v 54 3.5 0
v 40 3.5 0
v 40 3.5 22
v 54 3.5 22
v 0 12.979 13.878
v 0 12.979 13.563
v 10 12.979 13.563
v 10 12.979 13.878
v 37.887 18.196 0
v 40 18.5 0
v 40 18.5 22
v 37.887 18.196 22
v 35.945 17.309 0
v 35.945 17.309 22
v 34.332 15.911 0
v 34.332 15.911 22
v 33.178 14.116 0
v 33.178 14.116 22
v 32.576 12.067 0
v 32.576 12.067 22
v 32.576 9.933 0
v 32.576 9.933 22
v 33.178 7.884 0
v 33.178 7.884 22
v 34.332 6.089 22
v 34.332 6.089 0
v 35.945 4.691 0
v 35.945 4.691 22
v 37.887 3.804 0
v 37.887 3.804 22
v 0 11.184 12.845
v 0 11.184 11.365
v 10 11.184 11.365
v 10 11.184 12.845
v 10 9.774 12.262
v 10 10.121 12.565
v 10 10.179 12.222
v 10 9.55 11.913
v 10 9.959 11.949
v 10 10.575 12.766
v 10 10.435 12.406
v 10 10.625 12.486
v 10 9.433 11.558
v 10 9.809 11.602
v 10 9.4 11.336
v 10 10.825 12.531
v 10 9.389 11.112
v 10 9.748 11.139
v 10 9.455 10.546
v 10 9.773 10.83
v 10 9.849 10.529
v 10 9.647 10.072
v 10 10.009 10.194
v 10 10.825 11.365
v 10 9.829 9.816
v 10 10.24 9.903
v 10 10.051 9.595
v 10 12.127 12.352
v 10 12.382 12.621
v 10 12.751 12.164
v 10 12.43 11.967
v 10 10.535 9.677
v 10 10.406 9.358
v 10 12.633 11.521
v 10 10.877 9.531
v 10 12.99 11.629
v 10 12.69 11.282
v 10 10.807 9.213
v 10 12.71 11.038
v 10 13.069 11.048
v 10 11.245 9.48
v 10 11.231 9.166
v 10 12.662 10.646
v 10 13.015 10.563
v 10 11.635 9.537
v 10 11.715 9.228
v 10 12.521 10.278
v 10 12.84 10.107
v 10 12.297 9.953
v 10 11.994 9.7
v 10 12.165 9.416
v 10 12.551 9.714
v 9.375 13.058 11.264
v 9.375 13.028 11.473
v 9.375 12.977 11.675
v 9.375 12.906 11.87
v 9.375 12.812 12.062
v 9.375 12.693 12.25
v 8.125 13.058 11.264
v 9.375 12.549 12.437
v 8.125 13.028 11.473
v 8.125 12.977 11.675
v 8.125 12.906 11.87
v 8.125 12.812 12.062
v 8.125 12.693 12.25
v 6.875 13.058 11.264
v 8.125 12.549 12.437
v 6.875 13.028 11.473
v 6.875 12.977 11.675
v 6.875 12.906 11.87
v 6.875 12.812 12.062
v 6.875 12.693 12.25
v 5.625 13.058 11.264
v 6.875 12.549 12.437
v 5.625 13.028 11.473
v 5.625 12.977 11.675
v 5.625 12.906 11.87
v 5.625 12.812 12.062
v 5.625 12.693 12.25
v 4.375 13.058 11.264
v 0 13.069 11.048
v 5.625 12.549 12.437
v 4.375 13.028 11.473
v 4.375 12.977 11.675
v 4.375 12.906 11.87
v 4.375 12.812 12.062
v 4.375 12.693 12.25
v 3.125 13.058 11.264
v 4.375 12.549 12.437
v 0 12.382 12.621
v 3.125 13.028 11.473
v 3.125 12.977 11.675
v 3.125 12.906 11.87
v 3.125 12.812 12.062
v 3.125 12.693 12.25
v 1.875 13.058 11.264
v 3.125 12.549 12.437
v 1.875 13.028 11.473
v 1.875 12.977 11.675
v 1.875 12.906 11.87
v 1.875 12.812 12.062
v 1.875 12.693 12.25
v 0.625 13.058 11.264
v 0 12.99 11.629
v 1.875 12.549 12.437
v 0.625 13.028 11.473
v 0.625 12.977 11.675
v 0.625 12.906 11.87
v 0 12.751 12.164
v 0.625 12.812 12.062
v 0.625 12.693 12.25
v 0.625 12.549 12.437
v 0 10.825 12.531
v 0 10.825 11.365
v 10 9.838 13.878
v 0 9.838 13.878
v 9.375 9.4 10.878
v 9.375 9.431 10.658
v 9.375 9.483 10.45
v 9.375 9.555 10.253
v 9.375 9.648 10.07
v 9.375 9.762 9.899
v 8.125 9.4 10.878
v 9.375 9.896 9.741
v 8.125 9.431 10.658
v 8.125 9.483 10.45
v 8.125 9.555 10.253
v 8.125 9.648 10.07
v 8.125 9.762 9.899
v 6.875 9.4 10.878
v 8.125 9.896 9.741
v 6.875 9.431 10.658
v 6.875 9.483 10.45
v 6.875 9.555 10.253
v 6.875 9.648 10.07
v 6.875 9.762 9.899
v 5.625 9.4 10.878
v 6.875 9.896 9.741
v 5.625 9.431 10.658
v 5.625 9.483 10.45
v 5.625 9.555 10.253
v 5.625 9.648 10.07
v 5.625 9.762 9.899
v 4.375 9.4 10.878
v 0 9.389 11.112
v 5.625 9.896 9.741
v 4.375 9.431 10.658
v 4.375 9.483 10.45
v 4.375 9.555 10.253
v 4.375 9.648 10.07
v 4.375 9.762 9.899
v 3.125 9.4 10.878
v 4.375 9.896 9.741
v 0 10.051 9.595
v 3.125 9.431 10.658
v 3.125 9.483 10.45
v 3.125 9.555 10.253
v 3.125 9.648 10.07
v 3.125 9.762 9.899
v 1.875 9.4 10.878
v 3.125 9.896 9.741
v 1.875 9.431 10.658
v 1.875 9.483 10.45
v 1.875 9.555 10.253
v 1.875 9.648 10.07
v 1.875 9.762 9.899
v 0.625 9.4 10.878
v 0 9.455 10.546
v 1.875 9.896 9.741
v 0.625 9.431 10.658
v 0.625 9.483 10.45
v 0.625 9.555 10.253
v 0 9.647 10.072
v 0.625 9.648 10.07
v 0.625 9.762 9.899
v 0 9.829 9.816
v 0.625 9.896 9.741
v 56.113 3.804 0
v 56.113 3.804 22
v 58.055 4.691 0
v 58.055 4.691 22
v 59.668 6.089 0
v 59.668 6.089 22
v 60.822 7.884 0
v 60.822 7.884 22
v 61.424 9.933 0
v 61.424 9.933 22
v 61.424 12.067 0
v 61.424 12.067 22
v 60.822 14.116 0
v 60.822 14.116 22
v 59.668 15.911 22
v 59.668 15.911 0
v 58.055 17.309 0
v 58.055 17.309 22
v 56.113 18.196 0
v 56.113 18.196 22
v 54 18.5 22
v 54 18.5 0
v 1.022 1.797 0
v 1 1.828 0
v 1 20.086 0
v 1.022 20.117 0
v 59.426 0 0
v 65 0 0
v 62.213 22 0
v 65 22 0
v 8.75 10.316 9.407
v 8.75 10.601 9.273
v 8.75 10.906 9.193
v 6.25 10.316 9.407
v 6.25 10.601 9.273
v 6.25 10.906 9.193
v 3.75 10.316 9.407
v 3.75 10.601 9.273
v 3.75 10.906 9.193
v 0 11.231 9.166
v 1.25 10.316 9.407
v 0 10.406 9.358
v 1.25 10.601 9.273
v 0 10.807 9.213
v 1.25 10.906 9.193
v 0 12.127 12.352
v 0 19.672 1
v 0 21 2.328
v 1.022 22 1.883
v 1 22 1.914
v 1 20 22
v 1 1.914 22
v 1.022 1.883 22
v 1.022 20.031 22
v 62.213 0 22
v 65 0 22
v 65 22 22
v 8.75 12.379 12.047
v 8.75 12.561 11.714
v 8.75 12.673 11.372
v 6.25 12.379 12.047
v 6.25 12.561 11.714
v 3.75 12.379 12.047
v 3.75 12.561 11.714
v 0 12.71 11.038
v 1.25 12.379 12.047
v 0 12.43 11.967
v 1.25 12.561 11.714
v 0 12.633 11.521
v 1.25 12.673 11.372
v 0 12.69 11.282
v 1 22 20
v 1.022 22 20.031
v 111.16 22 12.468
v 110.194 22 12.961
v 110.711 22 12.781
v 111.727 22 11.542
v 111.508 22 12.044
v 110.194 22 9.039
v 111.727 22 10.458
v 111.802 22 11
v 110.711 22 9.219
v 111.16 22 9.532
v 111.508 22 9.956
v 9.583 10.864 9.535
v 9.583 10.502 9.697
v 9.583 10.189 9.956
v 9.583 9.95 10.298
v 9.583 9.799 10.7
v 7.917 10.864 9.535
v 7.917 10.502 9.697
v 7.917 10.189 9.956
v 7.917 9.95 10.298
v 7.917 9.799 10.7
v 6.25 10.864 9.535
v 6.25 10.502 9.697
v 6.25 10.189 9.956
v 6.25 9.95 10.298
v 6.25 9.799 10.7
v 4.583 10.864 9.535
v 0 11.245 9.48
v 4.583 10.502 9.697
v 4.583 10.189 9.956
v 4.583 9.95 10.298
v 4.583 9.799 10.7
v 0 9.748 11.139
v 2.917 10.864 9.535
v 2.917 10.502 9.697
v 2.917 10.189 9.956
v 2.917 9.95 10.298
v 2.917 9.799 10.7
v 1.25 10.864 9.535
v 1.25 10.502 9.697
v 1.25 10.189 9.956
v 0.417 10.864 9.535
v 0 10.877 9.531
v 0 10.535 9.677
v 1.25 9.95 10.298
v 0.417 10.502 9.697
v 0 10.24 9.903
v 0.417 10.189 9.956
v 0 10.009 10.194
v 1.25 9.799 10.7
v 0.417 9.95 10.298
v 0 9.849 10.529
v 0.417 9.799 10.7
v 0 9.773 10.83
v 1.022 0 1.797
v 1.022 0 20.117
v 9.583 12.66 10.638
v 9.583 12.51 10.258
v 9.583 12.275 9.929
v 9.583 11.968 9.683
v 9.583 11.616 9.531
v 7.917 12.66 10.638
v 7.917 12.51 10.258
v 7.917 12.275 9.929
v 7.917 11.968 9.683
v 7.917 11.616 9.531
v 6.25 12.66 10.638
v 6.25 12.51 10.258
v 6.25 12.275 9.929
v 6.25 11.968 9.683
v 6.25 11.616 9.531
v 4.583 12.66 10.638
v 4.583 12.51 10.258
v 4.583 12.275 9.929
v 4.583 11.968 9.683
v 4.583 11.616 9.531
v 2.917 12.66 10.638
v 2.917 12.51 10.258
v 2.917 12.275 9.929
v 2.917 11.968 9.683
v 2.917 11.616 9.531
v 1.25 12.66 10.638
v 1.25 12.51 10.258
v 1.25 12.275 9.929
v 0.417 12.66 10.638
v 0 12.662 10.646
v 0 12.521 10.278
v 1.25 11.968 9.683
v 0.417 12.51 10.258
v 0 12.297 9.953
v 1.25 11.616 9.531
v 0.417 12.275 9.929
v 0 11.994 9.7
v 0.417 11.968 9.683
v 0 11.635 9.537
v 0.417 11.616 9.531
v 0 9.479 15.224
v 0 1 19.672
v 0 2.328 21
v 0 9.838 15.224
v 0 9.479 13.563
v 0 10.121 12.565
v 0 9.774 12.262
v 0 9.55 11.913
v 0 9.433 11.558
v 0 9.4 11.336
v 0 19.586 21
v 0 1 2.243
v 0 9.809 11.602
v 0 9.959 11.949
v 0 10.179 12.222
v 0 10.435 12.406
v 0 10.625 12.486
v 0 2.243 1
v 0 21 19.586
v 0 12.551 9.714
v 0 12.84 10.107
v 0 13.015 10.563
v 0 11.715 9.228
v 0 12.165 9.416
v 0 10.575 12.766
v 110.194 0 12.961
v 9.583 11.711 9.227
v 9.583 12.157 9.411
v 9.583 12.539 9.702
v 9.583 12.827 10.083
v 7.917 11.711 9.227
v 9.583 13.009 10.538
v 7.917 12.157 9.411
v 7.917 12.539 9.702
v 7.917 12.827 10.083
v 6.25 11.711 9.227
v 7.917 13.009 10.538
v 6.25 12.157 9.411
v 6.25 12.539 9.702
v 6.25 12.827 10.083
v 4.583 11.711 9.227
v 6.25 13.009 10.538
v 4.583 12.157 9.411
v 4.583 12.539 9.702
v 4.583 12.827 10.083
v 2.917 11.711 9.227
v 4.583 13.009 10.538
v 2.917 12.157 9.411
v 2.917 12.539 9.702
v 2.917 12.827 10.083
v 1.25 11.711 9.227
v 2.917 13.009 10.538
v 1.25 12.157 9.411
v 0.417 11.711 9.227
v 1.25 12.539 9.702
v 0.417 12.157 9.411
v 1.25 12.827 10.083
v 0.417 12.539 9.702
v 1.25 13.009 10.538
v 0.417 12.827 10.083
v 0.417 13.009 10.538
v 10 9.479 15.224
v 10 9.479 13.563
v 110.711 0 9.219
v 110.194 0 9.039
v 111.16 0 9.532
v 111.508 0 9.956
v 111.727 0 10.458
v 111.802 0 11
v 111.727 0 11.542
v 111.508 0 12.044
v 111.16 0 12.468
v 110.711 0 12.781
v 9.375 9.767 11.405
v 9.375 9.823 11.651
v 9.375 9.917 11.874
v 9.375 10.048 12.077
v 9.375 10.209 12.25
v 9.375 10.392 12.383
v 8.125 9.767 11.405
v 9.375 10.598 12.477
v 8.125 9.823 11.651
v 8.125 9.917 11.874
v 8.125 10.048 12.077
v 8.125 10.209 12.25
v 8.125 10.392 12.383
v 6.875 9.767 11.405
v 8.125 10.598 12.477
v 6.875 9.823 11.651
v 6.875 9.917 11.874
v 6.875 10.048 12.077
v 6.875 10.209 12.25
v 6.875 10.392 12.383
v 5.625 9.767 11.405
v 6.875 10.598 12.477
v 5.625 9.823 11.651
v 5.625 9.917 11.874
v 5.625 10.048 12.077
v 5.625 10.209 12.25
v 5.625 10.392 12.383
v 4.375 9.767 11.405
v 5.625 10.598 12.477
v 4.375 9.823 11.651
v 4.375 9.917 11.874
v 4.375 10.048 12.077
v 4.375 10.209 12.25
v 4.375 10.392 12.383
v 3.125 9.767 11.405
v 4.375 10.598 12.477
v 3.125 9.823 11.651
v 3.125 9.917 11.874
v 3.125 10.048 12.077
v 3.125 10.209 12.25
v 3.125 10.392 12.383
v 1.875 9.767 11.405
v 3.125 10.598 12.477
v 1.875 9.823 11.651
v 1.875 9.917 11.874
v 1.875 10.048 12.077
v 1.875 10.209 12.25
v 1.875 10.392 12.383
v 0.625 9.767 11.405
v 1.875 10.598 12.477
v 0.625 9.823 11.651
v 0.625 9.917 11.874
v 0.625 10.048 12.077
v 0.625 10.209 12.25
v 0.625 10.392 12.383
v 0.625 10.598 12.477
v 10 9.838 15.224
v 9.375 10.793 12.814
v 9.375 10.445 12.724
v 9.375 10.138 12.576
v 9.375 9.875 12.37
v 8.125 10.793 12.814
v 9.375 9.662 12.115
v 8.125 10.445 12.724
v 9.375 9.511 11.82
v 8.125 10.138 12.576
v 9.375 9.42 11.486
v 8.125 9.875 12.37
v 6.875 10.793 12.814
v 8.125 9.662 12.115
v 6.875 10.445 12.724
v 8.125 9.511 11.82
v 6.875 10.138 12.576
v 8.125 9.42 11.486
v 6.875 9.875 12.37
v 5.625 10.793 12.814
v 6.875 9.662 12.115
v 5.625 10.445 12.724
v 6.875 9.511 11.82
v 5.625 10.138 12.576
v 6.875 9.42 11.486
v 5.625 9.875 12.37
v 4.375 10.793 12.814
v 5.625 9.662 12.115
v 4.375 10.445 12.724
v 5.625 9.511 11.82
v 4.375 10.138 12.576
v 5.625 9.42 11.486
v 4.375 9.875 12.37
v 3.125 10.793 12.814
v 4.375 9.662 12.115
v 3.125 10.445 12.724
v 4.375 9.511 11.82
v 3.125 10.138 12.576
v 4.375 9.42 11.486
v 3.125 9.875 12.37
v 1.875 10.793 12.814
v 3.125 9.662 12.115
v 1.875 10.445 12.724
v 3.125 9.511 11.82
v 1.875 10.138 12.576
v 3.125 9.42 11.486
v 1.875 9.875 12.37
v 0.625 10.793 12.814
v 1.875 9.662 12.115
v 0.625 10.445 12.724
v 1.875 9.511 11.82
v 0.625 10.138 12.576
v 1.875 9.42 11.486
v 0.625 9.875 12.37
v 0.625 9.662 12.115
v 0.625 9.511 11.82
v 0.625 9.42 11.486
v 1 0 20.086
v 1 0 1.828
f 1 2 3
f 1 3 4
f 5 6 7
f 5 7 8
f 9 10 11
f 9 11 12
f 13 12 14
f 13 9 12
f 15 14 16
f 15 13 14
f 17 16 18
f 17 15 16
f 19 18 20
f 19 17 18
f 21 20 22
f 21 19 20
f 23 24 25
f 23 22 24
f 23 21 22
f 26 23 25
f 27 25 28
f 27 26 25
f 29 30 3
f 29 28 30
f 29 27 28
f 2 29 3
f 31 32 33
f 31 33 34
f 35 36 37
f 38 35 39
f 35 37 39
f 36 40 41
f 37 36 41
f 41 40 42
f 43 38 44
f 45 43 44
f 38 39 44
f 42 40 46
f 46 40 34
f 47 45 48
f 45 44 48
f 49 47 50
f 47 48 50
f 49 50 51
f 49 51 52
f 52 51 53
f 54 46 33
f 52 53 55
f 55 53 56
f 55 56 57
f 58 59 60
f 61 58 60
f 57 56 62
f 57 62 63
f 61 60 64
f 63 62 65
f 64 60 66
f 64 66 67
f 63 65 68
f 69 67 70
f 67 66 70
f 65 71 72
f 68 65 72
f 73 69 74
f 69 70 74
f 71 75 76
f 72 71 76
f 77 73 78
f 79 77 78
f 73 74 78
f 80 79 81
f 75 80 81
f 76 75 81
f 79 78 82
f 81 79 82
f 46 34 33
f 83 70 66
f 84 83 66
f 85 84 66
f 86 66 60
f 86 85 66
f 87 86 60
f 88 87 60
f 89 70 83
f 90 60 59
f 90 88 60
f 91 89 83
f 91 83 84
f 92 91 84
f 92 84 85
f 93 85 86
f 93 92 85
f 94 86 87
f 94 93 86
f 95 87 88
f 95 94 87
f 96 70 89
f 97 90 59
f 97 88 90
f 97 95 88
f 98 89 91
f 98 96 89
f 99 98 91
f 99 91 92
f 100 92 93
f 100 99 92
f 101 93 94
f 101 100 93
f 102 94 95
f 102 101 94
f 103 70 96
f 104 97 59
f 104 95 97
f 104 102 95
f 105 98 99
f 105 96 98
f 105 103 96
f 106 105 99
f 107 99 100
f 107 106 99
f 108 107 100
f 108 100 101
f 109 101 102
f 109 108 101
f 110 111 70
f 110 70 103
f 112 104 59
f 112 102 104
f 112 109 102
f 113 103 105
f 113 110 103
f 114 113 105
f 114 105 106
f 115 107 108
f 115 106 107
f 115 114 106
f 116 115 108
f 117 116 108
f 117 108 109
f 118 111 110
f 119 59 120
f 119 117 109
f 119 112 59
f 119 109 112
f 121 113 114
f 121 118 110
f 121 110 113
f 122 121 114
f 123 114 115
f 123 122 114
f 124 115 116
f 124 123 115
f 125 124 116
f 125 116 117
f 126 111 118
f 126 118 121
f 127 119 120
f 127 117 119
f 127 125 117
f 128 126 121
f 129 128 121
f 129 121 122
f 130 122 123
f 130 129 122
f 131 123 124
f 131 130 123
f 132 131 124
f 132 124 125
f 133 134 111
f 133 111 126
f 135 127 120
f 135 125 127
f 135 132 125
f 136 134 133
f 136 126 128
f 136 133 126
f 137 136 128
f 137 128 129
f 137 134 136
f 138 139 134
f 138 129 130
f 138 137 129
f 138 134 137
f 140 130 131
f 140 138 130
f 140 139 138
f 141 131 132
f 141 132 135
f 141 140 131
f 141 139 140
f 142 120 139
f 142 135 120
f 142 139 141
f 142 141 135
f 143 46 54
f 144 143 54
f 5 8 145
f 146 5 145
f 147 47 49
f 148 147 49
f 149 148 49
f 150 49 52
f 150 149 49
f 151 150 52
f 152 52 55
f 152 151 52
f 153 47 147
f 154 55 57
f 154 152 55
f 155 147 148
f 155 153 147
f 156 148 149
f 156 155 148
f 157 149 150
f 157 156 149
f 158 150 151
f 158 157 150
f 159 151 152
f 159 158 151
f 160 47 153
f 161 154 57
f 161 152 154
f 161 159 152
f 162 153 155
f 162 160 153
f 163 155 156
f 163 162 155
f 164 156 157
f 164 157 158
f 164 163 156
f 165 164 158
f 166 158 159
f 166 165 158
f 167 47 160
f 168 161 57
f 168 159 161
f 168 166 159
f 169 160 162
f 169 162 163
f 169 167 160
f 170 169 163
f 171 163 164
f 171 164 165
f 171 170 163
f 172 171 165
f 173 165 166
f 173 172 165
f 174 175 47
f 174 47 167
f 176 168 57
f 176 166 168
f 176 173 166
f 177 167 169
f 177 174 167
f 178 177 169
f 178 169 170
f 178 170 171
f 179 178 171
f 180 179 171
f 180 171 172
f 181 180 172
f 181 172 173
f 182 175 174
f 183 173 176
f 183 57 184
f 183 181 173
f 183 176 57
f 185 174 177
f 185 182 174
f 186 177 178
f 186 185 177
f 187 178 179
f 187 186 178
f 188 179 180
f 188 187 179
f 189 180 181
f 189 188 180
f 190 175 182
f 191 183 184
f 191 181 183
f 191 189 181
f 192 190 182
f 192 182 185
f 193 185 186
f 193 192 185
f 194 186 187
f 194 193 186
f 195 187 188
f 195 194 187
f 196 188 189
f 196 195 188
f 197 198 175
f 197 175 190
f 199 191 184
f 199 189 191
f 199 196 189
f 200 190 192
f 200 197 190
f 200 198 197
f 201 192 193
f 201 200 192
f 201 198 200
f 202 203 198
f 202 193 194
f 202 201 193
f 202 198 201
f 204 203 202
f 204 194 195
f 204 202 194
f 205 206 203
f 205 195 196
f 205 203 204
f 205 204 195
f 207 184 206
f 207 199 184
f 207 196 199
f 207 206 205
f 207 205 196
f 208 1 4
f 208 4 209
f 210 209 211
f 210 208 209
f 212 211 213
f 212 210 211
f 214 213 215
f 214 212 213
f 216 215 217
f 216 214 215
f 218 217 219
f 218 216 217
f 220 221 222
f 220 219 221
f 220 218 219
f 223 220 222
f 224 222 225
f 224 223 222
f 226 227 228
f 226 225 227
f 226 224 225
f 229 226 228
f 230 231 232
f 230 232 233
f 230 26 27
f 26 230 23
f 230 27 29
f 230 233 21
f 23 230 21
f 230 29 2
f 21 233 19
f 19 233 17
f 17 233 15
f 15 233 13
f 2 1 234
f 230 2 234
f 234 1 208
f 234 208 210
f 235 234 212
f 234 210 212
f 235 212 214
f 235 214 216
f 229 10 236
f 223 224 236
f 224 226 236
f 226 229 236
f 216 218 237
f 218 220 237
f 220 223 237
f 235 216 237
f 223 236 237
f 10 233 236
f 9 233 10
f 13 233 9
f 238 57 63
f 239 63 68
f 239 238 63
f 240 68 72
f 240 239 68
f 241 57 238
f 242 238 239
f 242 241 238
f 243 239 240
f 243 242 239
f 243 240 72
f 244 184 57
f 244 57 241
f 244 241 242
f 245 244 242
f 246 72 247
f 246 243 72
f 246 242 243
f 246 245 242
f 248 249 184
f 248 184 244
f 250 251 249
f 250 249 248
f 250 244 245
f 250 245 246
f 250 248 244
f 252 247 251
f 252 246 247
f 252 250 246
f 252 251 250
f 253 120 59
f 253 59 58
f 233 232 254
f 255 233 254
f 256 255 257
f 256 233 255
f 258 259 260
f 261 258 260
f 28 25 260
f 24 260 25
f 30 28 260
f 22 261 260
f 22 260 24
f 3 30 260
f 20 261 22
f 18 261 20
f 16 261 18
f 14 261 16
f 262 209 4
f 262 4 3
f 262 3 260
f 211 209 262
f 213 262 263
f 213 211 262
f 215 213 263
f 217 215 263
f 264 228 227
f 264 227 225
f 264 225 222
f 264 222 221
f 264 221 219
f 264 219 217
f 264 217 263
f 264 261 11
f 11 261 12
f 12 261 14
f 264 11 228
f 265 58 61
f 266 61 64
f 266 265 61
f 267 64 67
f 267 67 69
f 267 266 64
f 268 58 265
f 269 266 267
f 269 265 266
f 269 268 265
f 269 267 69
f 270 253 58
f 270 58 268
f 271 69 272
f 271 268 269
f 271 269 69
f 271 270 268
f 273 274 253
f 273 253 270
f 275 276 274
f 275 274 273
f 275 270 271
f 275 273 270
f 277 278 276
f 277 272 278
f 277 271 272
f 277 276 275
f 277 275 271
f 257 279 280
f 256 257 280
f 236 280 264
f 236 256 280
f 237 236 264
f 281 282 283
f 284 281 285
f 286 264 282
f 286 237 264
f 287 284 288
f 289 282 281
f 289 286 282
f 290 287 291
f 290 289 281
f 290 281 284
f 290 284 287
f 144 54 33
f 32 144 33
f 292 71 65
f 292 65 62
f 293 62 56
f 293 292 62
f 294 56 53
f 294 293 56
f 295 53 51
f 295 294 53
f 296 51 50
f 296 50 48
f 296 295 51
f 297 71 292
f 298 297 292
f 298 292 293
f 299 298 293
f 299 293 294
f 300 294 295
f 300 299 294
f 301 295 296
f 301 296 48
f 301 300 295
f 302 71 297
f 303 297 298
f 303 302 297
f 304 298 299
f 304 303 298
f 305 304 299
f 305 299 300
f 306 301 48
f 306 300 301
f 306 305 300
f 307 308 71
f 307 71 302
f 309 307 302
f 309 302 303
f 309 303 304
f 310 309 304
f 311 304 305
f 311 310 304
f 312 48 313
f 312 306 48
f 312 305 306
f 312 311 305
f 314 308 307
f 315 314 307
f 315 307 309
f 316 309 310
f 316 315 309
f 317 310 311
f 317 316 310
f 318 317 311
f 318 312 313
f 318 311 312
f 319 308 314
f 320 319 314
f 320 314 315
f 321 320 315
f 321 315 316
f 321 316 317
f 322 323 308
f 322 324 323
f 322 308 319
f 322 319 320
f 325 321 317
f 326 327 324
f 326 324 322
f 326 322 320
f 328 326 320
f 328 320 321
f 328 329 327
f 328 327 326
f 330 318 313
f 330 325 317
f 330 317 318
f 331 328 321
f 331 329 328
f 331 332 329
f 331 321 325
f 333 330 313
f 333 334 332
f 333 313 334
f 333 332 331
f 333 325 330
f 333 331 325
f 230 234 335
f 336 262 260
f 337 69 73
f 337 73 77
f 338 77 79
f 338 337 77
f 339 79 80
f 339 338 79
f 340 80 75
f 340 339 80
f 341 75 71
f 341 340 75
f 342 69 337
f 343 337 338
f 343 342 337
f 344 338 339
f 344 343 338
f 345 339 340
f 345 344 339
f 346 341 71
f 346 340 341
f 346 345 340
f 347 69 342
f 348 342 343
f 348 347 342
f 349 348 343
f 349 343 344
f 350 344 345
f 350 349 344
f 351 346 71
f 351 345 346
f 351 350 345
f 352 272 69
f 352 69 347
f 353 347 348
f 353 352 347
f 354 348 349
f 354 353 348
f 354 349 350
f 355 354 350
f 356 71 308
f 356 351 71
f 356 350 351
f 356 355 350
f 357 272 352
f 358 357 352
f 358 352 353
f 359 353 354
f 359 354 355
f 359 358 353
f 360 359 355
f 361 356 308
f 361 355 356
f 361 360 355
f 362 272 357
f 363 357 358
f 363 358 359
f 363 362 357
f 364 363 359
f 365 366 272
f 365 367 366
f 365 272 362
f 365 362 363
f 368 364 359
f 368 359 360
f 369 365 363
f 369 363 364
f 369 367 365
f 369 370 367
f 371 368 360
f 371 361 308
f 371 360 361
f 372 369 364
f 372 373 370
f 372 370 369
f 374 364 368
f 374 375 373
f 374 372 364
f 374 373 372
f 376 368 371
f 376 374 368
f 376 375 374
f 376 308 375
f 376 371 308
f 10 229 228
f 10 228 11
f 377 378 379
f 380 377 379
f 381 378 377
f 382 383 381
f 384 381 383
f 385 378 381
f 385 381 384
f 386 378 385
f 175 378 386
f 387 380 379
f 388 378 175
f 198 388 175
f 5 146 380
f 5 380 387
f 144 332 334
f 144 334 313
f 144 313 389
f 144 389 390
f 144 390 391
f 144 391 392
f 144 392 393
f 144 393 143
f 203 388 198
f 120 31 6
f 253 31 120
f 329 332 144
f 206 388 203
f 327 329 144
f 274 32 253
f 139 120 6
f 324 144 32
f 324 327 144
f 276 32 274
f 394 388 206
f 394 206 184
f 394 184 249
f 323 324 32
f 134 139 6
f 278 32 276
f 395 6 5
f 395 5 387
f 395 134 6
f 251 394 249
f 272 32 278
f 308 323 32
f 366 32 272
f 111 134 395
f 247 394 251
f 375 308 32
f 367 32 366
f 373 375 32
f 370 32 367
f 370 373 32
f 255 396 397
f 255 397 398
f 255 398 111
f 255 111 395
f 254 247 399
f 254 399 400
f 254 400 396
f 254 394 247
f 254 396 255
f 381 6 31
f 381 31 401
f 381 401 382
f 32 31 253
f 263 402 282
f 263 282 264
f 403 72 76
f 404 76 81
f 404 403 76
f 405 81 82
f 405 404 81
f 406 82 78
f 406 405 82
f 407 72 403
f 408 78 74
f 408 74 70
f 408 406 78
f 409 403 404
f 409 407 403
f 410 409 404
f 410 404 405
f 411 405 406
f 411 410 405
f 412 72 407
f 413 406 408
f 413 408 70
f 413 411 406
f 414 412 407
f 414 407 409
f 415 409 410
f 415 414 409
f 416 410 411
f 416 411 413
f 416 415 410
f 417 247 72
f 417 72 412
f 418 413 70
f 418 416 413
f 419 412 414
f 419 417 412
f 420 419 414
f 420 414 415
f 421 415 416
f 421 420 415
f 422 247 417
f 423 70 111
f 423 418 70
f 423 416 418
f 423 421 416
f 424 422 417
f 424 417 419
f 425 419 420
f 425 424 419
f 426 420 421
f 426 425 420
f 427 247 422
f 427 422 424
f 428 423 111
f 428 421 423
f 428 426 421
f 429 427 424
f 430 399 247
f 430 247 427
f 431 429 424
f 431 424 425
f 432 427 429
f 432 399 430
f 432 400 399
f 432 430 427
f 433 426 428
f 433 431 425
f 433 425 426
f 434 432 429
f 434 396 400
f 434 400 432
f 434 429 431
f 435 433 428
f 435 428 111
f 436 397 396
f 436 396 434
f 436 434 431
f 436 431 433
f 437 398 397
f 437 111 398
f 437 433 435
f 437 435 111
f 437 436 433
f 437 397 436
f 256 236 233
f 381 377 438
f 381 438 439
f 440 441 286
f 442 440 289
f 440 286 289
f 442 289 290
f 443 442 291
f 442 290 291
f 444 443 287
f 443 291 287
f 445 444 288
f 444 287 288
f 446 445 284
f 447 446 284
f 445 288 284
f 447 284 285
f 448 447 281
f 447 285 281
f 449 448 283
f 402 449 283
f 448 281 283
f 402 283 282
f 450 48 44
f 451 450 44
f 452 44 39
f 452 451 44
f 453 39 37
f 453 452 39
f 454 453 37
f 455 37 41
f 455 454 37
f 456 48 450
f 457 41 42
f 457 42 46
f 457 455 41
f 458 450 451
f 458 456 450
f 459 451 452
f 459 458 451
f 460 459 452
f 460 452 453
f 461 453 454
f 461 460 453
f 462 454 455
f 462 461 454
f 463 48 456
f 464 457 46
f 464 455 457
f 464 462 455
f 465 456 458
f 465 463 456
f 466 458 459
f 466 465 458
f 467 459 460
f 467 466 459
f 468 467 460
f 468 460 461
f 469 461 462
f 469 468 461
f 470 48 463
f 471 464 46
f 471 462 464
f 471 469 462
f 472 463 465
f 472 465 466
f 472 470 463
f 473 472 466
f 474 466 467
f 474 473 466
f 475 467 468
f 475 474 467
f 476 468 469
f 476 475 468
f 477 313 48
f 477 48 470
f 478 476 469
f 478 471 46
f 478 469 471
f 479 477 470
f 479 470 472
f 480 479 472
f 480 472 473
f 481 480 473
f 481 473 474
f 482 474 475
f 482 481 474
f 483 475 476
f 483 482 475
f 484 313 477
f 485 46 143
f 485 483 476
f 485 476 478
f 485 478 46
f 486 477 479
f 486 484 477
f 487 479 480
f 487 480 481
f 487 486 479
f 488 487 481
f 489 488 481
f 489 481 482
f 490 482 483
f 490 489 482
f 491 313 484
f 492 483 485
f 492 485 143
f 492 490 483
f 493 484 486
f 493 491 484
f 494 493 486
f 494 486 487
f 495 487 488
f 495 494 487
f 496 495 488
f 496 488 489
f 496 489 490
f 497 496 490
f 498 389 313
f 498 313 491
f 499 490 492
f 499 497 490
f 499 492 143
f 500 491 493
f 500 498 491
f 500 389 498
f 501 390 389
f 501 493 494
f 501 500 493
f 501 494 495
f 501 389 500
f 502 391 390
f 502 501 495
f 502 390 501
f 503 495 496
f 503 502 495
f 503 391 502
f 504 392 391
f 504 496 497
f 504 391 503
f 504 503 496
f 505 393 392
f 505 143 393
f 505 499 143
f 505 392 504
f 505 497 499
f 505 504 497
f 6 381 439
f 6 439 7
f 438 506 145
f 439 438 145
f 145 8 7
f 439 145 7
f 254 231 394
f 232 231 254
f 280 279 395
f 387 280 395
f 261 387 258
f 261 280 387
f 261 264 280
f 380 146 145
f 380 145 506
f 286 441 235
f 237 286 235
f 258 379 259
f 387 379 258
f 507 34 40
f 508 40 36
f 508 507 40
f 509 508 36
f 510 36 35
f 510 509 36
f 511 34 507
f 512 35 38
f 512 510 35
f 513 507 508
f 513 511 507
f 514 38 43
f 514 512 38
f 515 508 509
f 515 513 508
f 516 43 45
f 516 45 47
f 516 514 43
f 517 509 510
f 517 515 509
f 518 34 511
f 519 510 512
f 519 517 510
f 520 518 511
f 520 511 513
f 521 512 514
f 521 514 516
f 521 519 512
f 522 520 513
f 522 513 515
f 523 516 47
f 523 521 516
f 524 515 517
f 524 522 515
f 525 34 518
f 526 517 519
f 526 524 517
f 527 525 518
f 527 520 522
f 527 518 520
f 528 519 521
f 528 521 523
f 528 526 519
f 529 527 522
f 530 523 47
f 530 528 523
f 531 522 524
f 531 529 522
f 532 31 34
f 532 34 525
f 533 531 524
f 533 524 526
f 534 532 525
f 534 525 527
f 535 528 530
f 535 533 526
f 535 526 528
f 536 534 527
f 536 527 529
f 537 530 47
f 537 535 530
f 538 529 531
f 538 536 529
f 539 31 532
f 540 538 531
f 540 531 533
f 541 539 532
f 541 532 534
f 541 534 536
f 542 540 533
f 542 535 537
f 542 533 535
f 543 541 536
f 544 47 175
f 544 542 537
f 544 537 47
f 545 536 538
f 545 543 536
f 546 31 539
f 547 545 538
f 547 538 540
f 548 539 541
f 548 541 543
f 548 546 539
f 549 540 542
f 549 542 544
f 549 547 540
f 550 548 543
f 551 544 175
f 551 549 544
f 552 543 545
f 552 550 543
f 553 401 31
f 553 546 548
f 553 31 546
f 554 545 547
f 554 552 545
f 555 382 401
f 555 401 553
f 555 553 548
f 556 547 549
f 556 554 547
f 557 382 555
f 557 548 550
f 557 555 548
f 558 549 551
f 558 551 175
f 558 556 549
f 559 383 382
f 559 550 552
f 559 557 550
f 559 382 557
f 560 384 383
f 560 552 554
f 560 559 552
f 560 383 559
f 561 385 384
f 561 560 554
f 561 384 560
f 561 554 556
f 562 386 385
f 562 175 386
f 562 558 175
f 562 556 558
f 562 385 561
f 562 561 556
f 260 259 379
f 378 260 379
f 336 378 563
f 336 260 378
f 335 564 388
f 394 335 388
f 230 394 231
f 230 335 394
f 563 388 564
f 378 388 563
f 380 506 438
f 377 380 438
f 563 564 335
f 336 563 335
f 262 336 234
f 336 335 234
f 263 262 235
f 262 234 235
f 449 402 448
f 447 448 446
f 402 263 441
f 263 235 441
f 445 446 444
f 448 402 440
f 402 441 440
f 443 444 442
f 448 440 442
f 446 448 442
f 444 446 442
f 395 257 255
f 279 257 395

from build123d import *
from OCP.BRepFilletAPI import BRepFilletAPI_MakeChamfer

# Parameters (mm, degrees)
SKIZZE1_W                            = 120
SKIZZE1_H                            = 22
AUFSATZ_LINEAR_AUSTRAGEN1_DEPTH      = 22
SCHNITT_LINEAR_AUSTRAGEN1_DEPTH      = 124.967737738
SCHNITT_LINEAR_AUSTRAGEN1_DEPTH_BACK = 124.967737738
SCHNITT_LINEAR_AUSTRAGEN5_DEPTH      = 124.967737738
SCHNITT_LINEAR_AUSTRAGEN6_DEPTH      = 124.967737738
VERRUNDUNG1_R                        = 2
SCHNITT_LINEAR_AUSTRAGEN7_DEPTH      = 73.062472897
KREISMUSTER1_COUNT                   = 4
FASE1_SIZE                           = 1
FASE1_SIZE2                          = 1.022482955
SCHNITT_LINEAR_AUSTRAGEN8_DEPTH      = 10


with BuildPart() as part:
    # Skizze1 → Aufsatz-Linear austragen1 (new body)
    with BuildSketch(Plane.XY):
        with Locations((60, 11)):
            Rectangle(SKIZZE1_W, SKIZZE1_H)
    extrude(amount=AUFSATZ_LINEAR_AUSTRAGEN1_DEPTH)

    # Skizze2 → Schnitt-Linear austragen1 (cut, two sides: drawn at the far end of the back side and taken through both)
    with BuildSketch(Plane(origin=(0, 22, 0), x_dir=(1, 0, 0), z_dir=(0, 1, 0)).offset(-SCHNITT_LINEAR_AUSTRAGEN1_DEPTH_BACK)):
        Polygon((120, -11), (65, -22), (120, -22), align=None)
    extrude(amount=SCHNITT_LINEAR_AUSTRAGEN1_DEPTH + SCHNITT_LINEAR_AUSTRAGEN1_DEPTH_BACK, mode=Mode.SUBTRACT)

    # Skizze3 → Schnitt-Linear austragen5 (cut, through all)
    with BuildSketch(Plane.XZ):
        Polygon((120, 11), (65, 0), (120, 0), align=None)
    extrude(amount=-SCHNITT_LINEAR_AUSTRAGEN5_DEPTH, mode=Mode.SUBTRACT)

    # Skizze5 → Schnitt-Linear austragen6 (cut, through all)
    with BuildSketch(Plane(origin=(0, 0, 0), x_dir=(-1, 0, 0), z_dir=(0, 0, -1))):
        with BuildLine():
            Line((-54, 18.5), (-40, 18.5))
            ThreePointArc((-40, 18.5), (-32.5, 11), (-40, 3.5))
            Line((-40, 3.5), (-54, 3.5))
            ThreePointArc((-54, 3.5), (-61.5, 11), (-54, 18.5))
        make_face()
    extrude(amount=-SCHNITT_LINEAR_AUSTRAGEN6_DEPTH, mode=Mode.SUBTRACT)

    # Verrundung1
    verrundung1_edges = [part.edges().sort_by_distance(p)[0] for p in [
        (120, 11, 11),
    ]]
    fillet(verrundung1_edges, radius=VERRUNDUNG1_R)

    # 3D-Skizze1 → Schnitt-Linear austragen7 (cut, through all)
    with BuildSketch(Plane(origin=(65, 22, 22), x_dir=(-0.9995269630766537, 0, -0.03075467578697402), z_dir=(-0.02175198393938513, 0.7069394780300152, 0.7069394780300153))):
        Polygon((0, 0), (65.030761952, 0), (64.9692526, 2.827758229), align=None)
    schnitt_linear_austragen7 = extrude(amount=SCHNITT_LINEAR_AUSTRAGEN7_DEPTH, mode=Mode.SUBTRACT)

    # Kreismuster1: Schnitt-Linear austragen7 ×4 about axis
    kreismuster1_axis = Axis((0, 10.957123098, 10.957123098), (1, 0, 0))
    for i in range(1, KREISMUSTER1_COUNT):
        add(schnitt_linear_austragen7.rotate(kreismuster1_axis, i * 360 / KREISMUSTER1_COUNT), mode=Mode.SUBTRACT)

    # Fase1: one chamfer whose edges measure the first distance from different faces: ONE call of the kernel's chamfer builder (chamfer() names one face for all edges)
    fase1_edges_1 = [part.edges().sort_by_distance(p)[0] for p in [
        (0, 21, 21),
        (0, 0.957123098, 21.042876902),
        (0, 0.914246196, 0.914246196),
        (0, 21.042876902, 0.957123098),
    ]]
    fase1_side_1 = [part.faces().sort_by_distance(p)[0] for p in [
        (0, 10.993083294, 10.993083294),
    ]]
    fase1_edges_2 = [part.edges().sort_by_distance(p)[0] for p in [
        (0, 10.957123098, 22),
        (0, 0, 10.957123098),
        (0, 10.957123098, 0),
        (0, 22, 10.957123098),
    ]]
    fase1 = BRepFilletAPI_MakeChamfer(part.part.solid().wrapped)
    for e in fase1_edges_1:
        fase1.Add(FASE1_SIZE, FASE1_SIZE2, e.wrapped, fase1_side_1[0].wrapped)  # the first distance lies on this face
    for e in fase1_edges_2:
        fase1.Add(FASE1_SIZE, e.wrapped)
    add(Compound.cast(fase1.Shape()), mode=Mode.REPLACE)

    # Skizze6 → Schnitt-Linear austragen8 (cut)
    with BuildSketch(Plane.ZY):
        with BuildLine():
            Line((12.621096819, 12.381864671), (12.35186605, 12.126656338))
            add(Edge.make_bspline(
                [(12.35186605, 12.126656338), (12.303147162, 12.172487201), (12.206871115, 12.263056064), (12.049910873, 12.380567059), (11.886147239, 12.481233159), (11.716434742, 12.563139395), (11.544976188, 12.628492156), (11.374047412, 12.675020296), (11.20540171, 12.704692834), (11.093234492, 12.708241203), (11.037963806, 12.709989671)],
                knots=[0, 0, 0, 0, 1.08915593, 2.152340314, 3.188132944, 4.216796309, 5.218260357, 6.173443236, 7.099959455, 8, 8, 8, 8], degree=3))
            add(Edge.make_bspline(
                [(11.037963806, 12.709989671), (11.004049107, 12.709576065), (10.936307666, 12.708749926), (10.835685722, 12.698205711), (10.736119085, 12.683040847), (10.63779571, 12.661098969), (10.540524424, 12.63328991), (10.444643531, 12.598504446), (10.349974177, 12.557949202), (10.257408096, 12.511086728), (10.167667592, 12.459606882), (10.082910757, 12.402558341), (10.002597358, 12.341769551), (9.928236932, 12.275718572), (9.859401746, 12.205003707), (9.794453374, 12.1309404), (9.735676078, 12.051505182), (9.682584913, 11.968159556), (9.635223294, 11.882367367), (9.593414641, 11.794954377), (9.558317553, 11.706210523), (9.530548098, 11.616024445), (9.507637444, 11.525093855), (9.491519836, 11.432789134), (9.482433114, 11.339011449), (9.480861334, 11.276214191), (9.480071178, 11.24464512)],
                knots=[0, 0, 0, 0, 1.02818874, 2.053710826, 3.065248034, 4.081641283, 5.106893873, 6.131558223, 7.173050175, 8.228653731, 9.27666206, 10.308777013, 11.325269123, 12.329503258, 13.32196095, 14.316845687, 15.314881793, 16.315733098, 17.311955233, 18.285320748, 19.252783886, 20.203351036, 21.145449891, 22.095197417, 23.042428769, 24, 24, 24, 24], degree=3))
            add(Edge.make_bspline(
                [(9.480071178, 11.24464512), (9.480826897, 11.212374302), (9.482336269, 11.147920789), (9.491996589, 11.051726716), (9.509924829, 10.956961314), (9.533892538, 10.863313181), (9.563873354, 10.770621933), (9.60124602, 10.679289423), (9.645511621, 10.589319032), (9.696748173, 10.501521415), (9.752934376, 10.415998392), (9.815877457, 10.33543887), (9.88273804, 10.258770093), (9.95595194, 10.187694329), (10.033171483, 10.120310432), (10.116703759, 10.058474911), (10.204906219, 10.000996687), (10.297913431, 9.948600168), (10.394716213, 9.901791632), (10.493972966, 9.860167736), (10.596000782, 9.825888399), (10.700263472, 9.797950295), (10.806636743, 9.775049998), (10.915660546, 9.760317517), (11.026533254, 9.749626686), (11.101271887, 9.748845016), (11.138925345, 9.748451209)],
                knots=[0, 0, 0, 0, 0.93586088, 1.869166235, 2.799637598, 3.729985548, 4.670839027, 5.622275134, 6.589130586, 7.576015415, 8.568469353, 9.55398029, 10.53834874, 11.515998671, 12.510579167, 13.508179873, 14.527009472, 15.561807829, 16.601455013, 17.643573243, 18.680854198, 19.719860599, 20.772568776, 21.833555941, 22.908541556, 24, 24, 24, 24], degree=3))
            add(Edge.make_bspline(
                [(11.138925345, 9.748451209), (11.184303692, 9.749399786), (11.273411449, 9.751262469), (11.404397892, 9.765762759), (11.530200963, 9.788409553), (11.650467166, 9.821575449), (11.765336187, 9.863879124), (11.875229128, 9.914874511), (11.979280787, 9.97651757), (12.07780396, 10.046091437), (12.168561146, 10.123606269), (12.25041527, 10.207250724), (12.322060759, 10.296618791), (12.384565458, 10.391184106), (12.436274113, 10.491729411), (12.478716908, 10.597761974), (12.511250199, 10.709329486), (12.524605174, 10.786421118), (12.53135323, 10.825374286)],
                knots=[0, 0, 0, 0, 1.13008108, 2.219097802, 3.278683437, 4.311054135, 5.322181354, 6.324827112, 7.324222904, 8.330512327, 9.32562643, 10.293043162, 11.24128371, 12.174520618, 13.111833804, 14.052305215, 15.015860969, 16, 16, 16, 16], degree=3))
            Line((12.53135323, 10.825374286), (11.364686563, 10.825374286))
            Line((11.364686563, 10.825374286), (11.364686563, 11.184348645))
            Line((11.364686563, 11.184348645), (12.845455794, 11.184348645))
            add(Edge.make_bspline(
                [(12.845455794, 11.184348645), (12.843749945, 11.117441157), (12.840411292, 10.986491115), (12.816992376, 10.795520844), (12.779175864, 10.615149151), (12.727515552, 10.445186079), (12.660640272, 10.285872486), (12.579267743, 10.13704662), (12.482095622, 9.999669939), (12.372585181, 9.872620936), (12.249685223, 9.759291723), (12.116716603, 9.659685785), (11.973459635, 9.57578317), (11.820049827, 9.507522508), (11.656989394, 9.454248513), (11.483901014, 9.416476936), (11.301019413, 9.393846973), (11.175682736, 9.390955593), (11.111581595, 9.38947685)],
                knots=[0, 0, 0, 0, 1.140356446, 2.231883559, 3.274166699, 4.278491846, 5.25512956, 6.21435461, 7.1637429, 8.11826594, 9.068280886, 10.0076534, 10.945064095, 11.891975133, 12.864533718, 13.863980011, 14.907571808, 16, 16, 16, 16], degree=3))
            add(Edge.make_bspline(
                [(11.111581595, 9.38947685), (11.07207146, 9.390045972), (10.994144739, 9.391168462), (10.879053811, 9.39914581), (10.76713619, 9.411426386), (10.658408181, 9.429971509), (10.552469839, 9.452686164), (10.449850254, 9.481772882), (10.350158512, 9.515441582), (10.253240526, 9.553737255), (10.15997598, 9.598108912), (10.069949463, 9.647418551), (9.982663337, 9.701411912), (9.898712172, 9.761022758), (9.81765855, 9.825805218), (9.740025107, 9.895889137), (9.665377229, 9.971060257), (9.618616765, 10.024439266), (9.595055153, 10.051335825)],
                knots=[0, 0, 0, 0, 1.107784379, 2.184907829, 3.233506516, 4.263428166, 5.276301166, 6.270063455, 7.25232949, 8.225834625, 9.190232166, 10.146266622, 11.1027726, 12.066435141, 13.031522626, 14.010570082, 14.99756817, 16, 16, 16, 16], degree=3))
            add(Edge.make_bspline(
                [(9.595055153, 10.051335825), (9.560869221, 10.094006478), (9.493064808, 10.178639495), (9.405786651, 10.314239439), (9.331385249, 10.4546413), (9.271017426, 10.600235928), (9.22387934, 10.750887141), (9.190073087, 10.906402432), (9.170265798, 11.066982063), (9.167412261, 11.175647327), (9.165968614, 11.230622684)],
                knots=[0, 0, 0, 0, 1.023165419, 2.029347347, 3.013907458, 3.994755782, 4.975994455, 5.96558838, 6.970761222, 8, 8, 8, 8], degree=3))
            add(Edge.make_bspline(
                [(9.165968614, 11.230622684), (9.166500852, 11.271788937), (9.167558564, 11.353598244), (9.18038408, 11.475055551), (9.198785498, 11.594356244), (9.225832553, 11.7114028), (9.259928818, 11.826273392), (9.302482304, 11.939021355), (9.3520272, 12.049713227), (9.409612696, 12.157587095), (9.473697155, 12.261211508), (9.543247376, 12.360169311), (9.619250976, 12.452658376), (9.700466775, 12.539850024), (9.787863766, 12.620648871), (9.880623189, 12.695802982), (9.978816532, 12.765413168), (10.082752712, 12.828383003), (10.190880396, 12.884946623), (10.302940398, 12.934535835), (10.418898509, 12.97551915), (10.537885986, 13.01029293), (10.660803487, 13.036008071), (10.786759024, 13.054656816), (10.916409136, 13.067417416), (11.004045165, 13.068443671), (11.048480633, 13.06896403)],
                knots=[0, 0, 0, 0, 1.008945113, 2.00506715, 2.99143336, 3.967273523, 4.948097931, 5.927297278, 6.919902385, 7.919676788, 8.923139349, 9.905703106, 10.883022732, 11.856032218, 12.825136022, 13.798837087, 14.781400844, 15.773989409, 16.776158564, 17.77167057, 18.775803737, 19.789618931, 20.80898985, 21.851988756, 22.910860228, 24, 24, 24, 24], degree=3))
            add(Edge.make_bspline(
                [(11.048480633, 13.06896403), (11.084718877, 13.068384538), (11.156575056, 13.067235474), (11.263500788, 13.059270826), (11.368773803, 13.046646945), (11.472550193, 13.029420158), (11.574476559, 13.005956468), (11.674843264, 12.977878183), (11.7737958, 12.945186361), (11.87102405, 12.906197514), (11.967181766, 12.861943889), (12.062803606, 12.812130467), (12.157562852, 12.755905462), (12.251623834, 12.693101927), (12.345579691, 12.624798509), (12.437944334, 12.549041685), (12.530947278, 12.46881893), (12.590749092, 12.411136746), (12.621096819, 12.381864671)],
                knots=[0, 0, 0, 0, 0.985871117, 1.954866573, 2.915460327, 3.869826059, 4.81536089, 5.759505086, 6.70452669, 7.649098992, 8.607881297, 9.583363685, 10.581137262, 11.603961102, 12.659522466, 13.73993555, 14.853081303, 16, 16, 16, 16], degree=3))
        make_face()
        Polygon((13.563404512, 12.97922044), (13.877507076, 12.97922044), (13.877507076, 9.838194799), (15.223660922, 9.838194799), (15.223660922, 9.47922044), (13.563404512, 9.47922044), align=None)
    extrude(amount=-SCHNITT_LINEAR_AUSTRAGEN8_DEPTH, mode=Mode.SUBTRACT)


solid = part.part
